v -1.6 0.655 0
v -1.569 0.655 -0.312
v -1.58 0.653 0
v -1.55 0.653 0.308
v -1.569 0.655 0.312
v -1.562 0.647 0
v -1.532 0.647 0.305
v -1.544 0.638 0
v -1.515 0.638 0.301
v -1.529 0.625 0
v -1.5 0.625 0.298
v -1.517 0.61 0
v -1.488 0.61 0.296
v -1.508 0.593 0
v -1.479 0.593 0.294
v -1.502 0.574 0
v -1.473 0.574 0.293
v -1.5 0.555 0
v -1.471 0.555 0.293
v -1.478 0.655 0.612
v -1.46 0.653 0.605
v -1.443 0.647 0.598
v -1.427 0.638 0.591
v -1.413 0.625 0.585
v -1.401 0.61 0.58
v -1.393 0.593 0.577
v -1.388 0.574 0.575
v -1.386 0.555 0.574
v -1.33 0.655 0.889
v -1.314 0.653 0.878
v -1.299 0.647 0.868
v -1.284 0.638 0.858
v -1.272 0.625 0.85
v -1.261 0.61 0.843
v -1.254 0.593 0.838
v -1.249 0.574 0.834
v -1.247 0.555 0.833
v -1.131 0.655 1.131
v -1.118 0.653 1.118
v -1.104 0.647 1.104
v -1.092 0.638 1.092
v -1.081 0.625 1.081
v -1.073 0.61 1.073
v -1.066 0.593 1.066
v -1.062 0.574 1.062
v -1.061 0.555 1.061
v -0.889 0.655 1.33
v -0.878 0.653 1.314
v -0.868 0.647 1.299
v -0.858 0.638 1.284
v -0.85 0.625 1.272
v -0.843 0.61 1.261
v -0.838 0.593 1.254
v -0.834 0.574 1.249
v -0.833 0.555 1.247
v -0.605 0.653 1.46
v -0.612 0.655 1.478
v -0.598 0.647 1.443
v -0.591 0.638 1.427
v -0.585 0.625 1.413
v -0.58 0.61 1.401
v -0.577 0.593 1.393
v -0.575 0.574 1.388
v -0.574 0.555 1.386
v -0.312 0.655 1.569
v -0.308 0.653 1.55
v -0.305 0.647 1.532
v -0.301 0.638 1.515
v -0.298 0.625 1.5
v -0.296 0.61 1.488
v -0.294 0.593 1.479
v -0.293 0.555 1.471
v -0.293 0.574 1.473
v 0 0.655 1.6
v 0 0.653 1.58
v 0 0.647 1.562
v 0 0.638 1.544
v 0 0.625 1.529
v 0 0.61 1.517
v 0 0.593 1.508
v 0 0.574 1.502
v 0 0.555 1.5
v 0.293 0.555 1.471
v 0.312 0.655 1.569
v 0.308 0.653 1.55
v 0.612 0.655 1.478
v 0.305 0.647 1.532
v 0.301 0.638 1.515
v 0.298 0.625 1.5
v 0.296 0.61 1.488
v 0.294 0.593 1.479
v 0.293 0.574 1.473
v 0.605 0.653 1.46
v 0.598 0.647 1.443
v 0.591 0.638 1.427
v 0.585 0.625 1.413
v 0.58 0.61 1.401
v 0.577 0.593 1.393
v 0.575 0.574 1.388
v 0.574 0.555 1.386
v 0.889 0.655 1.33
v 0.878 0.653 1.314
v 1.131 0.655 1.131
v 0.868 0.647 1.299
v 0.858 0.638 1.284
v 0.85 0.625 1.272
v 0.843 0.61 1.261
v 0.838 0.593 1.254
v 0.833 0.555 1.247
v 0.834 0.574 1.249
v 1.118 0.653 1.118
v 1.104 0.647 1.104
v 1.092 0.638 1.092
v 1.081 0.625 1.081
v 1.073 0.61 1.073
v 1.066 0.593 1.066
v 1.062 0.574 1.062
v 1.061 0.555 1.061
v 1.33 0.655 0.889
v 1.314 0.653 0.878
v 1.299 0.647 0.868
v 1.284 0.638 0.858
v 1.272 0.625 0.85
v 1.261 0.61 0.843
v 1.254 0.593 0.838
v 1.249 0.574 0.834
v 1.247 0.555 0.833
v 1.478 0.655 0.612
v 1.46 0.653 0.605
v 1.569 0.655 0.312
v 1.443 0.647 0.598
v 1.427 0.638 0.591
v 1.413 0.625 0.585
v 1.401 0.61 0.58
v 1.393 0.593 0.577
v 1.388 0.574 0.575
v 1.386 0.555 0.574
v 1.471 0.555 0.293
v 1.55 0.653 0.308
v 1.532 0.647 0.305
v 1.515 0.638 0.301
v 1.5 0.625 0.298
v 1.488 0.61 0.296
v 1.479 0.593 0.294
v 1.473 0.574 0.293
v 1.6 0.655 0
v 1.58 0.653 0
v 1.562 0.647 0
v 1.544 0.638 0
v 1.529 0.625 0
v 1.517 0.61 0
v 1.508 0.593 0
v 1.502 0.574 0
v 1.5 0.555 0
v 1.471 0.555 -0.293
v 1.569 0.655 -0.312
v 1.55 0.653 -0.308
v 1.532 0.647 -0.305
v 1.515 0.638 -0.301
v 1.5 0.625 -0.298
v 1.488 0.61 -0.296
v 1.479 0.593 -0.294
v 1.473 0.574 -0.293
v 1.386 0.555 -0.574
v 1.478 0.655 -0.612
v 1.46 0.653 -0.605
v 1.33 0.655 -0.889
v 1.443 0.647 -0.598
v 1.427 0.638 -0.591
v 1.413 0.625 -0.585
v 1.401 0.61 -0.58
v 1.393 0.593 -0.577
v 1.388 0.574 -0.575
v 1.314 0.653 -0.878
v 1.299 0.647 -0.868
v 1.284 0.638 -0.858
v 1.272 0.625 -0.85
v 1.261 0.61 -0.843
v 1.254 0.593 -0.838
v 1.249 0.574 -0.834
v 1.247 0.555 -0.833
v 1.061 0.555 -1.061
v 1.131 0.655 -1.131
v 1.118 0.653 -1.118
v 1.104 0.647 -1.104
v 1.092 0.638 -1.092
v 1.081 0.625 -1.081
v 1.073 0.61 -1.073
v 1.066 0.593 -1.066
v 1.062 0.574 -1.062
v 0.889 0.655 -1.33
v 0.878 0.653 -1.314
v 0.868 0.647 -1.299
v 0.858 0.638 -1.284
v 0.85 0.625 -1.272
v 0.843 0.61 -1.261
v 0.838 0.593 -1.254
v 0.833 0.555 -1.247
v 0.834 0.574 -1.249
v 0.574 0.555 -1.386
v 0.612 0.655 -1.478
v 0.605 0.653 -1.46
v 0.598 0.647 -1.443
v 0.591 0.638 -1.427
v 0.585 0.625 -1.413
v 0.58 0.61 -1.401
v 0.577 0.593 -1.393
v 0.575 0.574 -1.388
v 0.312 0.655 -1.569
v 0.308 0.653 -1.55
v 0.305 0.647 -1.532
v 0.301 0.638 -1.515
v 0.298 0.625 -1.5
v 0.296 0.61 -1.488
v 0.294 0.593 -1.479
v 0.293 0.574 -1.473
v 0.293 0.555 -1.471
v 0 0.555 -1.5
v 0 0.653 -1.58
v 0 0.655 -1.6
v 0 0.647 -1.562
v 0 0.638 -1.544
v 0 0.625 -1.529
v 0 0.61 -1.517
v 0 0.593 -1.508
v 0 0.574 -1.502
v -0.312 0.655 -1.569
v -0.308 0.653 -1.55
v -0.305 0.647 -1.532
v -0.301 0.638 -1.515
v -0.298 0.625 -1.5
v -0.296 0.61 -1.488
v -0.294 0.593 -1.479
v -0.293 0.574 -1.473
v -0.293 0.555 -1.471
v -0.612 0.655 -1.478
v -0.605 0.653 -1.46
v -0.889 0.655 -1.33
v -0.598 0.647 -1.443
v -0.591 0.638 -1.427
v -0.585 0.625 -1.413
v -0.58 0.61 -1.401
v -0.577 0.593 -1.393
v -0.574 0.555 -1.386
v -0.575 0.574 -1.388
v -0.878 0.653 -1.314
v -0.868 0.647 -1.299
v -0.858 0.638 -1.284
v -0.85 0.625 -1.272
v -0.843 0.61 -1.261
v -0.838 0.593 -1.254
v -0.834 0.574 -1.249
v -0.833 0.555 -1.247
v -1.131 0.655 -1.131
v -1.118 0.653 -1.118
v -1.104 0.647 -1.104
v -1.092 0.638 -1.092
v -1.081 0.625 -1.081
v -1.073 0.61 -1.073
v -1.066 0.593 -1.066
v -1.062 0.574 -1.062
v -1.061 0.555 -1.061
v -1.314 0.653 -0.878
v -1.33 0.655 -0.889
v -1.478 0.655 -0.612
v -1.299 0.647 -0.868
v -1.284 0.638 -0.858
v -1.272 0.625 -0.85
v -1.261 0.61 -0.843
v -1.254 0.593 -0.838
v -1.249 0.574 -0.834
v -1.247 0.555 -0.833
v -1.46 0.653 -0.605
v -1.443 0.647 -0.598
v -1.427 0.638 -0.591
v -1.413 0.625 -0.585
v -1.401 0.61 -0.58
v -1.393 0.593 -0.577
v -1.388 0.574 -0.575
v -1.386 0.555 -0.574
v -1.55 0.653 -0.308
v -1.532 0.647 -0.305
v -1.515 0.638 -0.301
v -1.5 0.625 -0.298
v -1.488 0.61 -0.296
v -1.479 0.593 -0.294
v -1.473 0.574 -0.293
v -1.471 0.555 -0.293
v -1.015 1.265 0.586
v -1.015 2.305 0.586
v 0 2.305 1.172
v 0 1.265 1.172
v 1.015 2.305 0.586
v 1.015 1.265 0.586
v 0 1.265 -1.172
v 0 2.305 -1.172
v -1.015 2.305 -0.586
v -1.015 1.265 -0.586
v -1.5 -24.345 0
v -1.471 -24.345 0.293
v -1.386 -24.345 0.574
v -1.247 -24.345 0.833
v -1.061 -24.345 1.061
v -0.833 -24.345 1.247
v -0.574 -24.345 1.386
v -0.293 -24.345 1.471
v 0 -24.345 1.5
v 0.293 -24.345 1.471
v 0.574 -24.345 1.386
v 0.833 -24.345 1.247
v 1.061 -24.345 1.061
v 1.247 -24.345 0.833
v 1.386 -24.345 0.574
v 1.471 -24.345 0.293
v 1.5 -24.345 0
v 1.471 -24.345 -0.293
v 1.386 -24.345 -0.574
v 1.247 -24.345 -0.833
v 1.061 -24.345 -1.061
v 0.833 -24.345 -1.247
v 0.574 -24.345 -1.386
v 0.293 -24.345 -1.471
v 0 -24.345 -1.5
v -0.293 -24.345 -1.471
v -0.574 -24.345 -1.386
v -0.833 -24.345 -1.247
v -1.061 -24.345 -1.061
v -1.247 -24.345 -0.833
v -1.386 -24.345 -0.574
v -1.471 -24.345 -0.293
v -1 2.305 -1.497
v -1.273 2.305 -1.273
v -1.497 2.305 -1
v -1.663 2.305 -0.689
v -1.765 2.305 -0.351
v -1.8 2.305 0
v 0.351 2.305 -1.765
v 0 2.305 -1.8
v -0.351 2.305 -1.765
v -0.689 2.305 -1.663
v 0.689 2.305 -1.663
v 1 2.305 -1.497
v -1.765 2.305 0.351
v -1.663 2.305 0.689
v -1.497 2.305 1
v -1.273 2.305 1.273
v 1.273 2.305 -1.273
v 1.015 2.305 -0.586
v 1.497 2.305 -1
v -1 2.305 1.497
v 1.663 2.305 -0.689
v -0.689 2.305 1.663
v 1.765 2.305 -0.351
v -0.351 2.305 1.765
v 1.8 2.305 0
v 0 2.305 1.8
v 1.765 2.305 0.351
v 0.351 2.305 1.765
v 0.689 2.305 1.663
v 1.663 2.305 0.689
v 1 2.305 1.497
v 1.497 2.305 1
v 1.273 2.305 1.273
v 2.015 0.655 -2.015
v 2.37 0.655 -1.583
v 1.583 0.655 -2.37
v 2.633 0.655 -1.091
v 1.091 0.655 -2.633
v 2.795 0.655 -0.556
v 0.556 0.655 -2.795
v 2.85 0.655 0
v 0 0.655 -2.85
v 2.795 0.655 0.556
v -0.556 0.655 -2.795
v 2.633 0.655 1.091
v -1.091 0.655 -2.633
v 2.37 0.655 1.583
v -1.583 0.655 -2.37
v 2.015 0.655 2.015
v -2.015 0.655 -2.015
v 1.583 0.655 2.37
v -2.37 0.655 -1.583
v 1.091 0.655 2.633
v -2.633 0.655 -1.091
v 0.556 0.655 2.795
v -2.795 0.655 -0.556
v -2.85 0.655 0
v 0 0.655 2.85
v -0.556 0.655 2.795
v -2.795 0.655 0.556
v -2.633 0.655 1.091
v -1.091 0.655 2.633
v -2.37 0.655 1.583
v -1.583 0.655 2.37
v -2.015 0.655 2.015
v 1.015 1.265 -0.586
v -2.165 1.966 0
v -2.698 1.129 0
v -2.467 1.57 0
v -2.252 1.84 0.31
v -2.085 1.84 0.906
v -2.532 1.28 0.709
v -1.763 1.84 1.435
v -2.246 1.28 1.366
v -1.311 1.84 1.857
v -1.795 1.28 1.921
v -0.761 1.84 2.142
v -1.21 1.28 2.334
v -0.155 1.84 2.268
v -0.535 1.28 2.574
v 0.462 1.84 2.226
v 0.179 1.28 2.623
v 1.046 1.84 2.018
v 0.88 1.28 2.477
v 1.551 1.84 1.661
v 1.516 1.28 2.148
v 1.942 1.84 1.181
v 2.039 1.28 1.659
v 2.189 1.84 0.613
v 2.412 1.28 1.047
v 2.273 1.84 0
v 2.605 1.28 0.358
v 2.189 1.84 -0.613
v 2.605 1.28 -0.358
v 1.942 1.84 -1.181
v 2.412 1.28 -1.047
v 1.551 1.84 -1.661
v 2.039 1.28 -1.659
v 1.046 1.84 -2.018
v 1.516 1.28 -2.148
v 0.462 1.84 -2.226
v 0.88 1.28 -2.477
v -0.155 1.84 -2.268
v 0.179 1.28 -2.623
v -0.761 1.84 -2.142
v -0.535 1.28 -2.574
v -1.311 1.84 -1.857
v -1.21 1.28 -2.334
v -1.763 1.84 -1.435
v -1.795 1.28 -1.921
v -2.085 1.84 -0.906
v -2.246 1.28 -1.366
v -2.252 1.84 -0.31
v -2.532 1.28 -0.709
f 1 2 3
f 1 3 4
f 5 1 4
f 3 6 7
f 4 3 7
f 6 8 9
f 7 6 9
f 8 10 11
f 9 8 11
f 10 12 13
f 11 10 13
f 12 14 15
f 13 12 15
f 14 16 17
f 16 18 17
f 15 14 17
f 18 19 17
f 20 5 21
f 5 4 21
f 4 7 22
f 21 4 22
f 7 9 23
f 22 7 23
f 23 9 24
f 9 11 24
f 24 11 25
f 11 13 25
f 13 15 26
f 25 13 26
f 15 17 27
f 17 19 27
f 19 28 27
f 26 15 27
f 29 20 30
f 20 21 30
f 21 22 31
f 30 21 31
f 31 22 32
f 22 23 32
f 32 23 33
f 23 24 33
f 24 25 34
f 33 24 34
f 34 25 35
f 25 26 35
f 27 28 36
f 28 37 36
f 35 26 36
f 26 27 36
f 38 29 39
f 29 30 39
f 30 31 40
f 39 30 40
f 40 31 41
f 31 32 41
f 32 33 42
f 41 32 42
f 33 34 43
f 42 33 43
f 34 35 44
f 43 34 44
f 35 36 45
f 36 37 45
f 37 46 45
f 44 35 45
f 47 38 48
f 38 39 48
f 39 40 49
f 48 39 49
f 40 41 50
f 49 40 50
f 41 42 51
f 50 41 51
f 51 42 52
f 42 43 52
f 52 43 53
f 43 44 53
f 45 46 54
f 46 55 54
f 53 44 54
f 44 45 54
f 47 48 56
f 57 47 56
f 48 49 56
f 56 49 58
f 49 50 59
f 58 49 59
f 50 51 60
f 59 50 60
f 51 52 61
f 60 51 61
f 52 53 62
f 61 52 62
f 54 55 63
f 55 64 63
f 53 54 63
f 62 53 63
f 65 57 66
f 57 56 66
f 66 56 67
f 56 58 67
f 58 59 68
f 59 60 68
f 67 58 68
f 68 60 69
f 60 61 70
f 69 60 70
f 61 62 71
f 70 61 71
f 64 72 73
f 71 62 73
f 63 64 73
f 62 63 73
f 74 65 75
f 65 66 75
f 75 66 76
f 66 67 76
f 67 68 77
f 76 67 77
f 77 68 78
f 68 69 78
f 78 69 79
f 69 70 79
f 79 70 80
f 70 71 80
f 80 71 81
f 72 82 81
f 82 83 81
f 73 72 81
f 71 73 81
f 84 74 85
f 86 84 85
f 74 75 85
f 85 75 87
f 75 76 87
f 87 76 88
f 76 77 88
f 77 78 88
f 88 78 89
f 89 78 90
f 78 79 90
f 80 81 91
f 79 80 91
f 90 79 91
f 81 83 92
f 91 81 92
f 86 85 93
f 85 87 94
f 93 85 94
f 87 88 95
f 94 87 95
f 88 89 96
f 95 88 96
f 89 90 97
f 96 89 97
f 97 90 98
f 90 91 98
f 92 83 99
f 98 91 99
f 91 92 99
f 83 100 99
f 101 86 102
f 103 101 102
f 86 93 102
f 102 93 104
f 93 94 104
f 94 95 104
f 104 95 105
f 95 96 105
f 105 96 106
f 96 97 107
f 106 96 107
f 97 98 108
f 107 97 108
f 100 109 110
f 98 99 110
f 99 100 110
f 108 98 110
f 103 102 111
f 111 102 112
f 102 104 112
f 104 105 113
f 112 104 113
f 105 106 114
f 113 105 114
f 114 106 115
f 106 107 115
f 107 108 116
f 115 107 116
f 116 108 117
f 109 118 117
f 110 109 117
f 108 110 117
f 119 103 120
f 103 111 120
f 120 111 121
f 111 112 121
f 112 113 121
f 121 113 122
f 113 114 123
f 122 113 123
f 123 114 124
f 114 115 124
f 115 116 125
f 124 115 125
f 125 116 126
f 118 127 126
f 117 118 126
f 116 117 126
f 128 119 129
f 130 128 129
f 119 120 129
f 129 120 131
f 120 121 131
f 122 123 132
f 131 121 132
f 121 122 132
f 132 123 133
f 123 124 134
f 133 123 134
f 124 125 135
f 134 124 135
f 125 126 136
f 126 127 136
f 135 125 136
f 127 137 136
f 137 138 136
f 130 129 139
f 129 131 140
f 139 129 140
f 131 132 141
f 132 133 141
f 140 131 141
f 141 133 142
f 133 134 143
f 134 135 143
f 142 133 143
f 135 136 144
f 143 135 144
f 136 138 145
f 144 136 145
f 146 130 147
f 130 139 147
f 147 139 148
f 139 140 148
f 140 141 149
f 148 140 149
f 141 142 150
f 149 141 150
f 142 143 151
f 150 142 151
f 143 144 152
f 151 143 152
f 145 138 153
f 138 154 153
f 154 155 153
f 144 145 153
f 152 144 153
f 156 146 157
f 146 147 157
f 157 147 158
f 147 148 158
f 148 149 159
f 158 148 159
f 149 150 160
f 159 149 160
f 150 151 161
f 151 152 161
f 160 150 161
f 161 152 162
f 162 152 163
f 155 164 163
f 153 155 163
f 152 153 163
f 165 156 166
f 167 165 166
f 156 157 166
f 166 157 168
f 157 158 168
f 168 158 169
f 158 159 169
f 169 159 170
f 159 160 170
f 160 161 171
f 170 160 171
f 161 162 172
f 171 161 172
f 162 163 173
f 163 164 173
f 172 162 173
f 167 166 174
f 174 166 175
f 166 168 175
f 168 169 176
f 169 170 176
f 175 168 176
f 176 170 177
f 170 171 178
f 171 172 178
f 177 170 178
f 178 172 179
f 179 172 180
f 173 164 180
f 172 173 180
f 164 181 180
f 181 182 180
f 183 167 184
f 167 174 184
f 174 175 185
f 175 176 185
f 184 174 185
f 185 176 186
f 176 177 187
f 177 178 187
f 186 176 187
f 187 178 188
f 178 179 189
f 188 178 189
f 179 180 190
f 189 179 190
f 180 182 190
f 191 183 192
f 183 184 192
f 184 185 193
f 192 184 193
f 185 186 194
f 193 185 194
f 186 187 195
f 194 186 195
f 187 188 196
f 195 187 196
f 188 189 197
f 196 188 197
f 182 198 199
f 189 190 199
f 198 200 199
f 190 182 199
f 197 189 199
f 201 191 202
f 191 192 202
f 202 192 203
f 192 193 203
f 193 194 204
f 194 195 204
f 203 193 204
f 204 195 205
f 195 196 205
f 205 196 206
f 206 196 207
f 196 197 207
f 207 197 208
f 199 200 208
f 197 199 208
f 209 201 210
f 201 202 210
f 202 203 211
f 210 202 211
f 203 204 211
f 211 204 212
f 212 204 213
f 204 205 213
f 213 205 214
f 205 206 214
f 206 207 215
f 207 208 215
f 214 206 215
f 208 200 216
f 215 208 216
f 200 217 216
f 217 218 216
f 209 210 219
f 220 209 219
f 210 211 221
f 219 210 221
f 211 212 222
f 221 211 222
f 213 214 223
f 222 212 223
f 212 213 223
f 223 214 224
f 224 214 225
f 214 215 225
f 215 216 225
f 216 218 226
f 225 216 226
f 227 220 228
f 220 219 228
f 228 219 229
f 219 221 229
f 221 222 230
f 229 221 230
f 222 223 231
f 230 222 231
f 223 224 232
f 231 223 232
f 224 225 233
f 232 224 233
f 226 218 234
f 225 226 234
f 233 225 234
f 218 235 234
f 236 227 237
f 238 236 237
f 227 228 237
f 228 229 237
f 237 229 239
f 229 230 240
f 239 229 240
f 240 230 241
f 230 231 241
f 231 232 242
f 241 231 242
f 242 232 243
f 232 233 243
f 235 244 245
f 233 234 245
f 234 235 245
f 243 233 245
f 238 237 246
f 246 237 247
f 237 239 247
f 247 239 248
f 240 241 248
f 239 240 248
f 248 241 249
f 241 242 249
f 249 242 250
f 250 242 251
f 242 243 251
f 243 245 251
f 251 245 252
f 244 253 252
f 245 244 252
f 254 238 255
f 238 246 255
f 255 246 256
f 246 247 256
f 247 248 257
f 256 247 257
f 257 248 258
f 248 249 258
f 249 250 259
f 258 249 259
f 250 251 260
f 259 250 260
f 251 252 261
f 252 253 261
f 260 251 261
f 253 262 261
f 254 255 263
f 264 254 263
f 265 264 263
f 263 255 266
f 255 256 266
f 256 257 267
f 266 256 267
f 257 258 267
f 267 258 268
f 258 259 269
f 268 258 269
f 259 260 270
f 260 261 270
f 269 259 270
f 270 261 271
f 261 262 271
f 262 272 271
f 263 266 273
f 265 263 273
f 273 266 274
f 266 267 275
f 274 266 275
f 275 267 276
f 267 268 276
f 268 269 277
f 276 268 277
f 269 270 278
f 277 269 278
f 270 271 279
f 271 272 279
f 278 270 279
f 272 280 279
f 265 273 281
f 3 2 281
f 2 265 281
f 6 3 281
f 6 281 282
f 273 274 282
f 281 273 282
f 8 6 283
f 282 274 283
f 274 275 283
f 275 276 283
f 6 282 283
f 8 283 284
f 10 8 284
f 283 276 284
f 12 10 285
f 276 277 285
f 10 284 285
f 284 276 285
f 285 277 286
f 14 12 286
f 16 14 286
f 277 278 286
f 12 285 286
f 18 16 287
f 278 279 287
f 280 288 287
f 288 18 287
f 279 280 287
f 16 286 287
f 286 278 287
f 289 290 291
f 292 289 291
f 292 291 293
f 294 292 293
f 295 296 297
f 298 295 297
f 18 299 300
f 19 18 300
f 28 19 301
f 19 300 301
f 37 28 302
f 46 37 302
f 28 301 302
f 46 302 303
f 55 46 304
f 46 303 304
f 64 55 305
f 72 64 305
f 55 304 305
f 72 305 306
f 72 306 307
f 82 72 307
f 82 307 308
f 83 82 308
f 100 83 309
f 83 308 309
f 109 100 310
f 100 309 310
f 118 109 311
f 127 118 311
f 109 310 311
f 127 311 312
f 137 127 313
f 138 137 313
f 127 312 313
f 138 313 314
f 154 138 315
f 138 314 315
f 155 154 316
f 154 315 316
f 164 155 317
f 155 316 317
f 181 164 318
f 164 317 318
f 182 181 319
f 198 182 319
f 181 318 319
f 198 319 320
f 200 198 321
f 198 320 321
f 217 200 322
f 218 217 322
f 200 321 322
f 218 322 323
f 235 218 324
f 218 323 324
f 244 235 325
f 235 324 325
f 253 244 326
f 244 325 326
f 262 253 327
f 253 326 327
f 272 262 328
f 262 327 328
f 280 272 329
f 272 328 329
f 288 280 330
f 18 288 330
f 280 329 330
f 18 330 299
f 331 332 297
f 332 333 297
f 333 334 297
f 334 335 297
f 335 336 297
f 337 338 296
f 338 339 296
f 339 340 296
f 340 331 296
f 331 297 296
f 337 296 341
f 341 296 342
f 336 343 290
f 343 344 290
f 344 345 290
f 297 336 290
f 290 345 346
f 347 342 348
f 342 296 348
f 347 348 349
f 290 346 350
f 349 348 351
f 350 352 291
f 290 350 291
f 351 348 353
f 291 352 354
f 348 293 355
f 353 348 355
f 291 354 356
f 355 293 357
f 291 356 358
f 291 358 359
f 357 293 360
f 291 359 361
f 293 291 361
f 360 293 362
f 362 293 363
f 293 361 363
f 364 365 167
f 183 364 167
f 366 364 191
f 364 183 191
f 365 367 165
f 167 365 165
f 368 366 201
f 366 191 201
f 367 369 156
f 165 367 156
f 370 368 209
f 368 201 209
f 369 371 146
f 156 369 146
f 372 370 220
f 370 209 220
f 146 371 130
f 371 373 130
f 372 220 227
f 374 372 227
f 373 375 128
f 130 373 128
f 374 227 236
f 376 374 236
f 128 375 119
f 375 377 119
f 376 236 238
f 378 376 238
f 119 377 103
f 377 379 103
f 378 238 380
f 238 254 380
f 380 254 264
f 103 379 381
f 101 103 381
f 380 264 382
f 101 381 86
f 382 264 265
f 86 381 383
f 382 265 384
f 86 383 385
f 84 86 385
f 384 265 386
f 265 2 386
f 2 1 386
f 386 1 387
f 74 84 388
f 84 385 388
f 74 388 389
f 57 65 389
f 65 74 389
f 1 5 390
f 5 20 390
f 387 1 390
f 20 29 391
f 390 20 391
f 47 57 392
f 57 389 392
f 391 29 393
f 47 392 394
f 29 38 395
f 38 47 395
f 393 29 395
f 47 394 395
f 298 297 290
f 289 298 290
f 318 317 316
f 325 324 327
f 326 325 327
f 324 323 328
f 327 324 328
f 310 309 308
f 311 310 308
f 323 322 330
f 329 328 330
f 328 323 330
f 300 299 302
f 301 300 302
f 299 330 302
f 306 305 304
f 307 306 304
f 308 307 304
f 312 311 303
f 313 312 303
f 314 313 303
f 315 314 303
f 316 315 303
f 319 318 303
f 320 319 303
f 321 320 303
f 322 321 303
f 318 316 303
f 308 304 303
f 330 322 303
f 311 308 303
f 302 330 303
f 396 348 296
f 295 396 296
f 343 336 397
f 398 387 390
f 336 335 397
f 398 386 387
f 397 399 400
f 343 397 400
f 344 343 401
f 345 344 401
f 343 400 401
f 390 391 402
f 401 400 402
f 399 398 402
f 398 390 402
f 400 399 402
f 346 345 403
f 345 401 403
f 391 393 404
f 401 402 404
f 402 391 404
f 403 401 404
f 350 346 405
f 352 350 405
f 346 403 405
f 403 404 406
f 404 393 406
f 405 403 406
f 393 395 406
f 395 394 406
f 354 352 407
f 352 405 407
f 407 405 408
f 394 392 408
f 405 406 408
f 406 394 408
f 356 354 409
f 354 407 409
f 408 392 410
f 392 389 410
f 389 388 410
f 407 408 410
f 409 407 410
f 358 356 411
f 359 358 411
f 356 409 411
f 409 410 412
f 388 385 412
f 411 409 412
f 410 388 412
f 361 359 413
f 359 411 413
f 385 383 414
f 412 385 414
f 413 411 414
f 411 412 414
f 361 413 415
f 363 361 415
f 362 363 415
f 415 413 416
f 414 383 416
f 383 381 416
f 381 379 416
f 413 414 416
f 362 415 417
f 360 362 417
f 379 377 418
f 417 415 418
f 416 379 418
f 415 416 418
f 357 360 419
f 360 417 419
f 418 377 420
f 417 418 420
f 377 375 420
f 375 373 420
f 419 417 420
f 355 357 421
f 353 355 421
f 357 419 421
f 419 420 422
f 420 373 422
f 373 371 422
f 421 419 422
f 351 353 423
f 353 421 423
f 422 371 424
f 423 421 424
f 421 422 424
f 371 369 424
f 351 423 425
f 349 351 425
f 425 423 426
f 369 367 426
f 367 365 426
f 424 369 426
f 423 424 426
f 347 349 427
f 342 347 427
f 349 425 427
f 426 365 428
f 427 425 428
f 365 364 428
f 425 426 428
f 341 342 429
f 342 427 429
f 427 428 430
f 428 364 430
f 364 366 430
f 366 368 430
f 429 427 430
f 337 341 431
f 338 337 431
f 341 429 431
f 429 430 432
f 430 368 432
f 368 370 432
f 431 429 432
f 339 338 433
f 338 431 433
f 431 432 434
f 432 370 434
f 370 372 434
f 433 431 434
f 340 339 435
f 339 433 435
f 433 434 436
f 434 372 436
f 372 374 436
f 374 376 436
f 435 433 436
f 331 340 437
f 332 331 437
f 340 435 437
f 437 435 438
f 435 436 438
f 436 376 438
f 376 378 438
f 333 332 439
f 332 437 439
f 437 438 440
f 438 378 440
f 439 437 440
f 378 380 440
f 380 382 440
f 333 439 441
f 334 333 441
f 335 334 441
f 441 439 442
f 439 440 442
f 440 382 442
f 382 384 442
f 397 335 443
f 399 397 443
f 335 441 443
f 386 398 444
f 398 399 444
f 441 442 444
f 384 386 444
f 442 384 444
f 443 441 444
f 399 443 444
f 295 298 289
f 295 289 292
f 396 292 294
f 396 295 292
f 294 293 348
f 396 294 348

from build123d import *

# Parameters (mm, degrees)
CUT_EXTRUDE_1_DEPTH = 1.04
FILLET_1_R          = 0.1


with BuildPart() as part:
    # 草图1 → 旋转1 (revolve)
    with BuildSketch(Plane.XY):
        with BuildLine():
            Line((0, 2.304545455), (-1.8, 2.304545455))
            ThreePointArc((-1.8, 2.304545455), (-2.467032631, 1.569929856), (-2.85, 0.654545455))
            Line((-2.85, 0.654545455), (-1.5, 0.654545455))
            Line((-1.5, 0.654545455), (-1.5, -24.345454545))
            Line((-1.5, -24.345454545), (0, -24.345454545))
            Line((0, -24.345454545), (0, 2.304545455))
        make_face()
    revolve(axis=Axis((0, 0, 0), (0, 1, 0)))

    # 草图2 → 切除-拉伸1 (cut)
    with BuildSketch(Plane(origin=(0, 2.304545455, 0), x_dir=(1, 0, 0), z_dir=(0, 1, 0))):
        Polygon((0, -1.172021046), (1.015, -0.586010523), (1.015, 0.586010523), (0, 1.172021046), (-1.015, 0.586010523), (-1.015, -0.586010523), align=None)
    extrude(amount=-CUT_EXTRUDE_1_DEPTH, mode=Mode.SUBTRACT)

    # 圆角1
    fillet_1_edges = [part.edges().sort_by_distance(p)[0] for p in [
        (1.5, 0.654545455, 0),
    ]]
    fillet(fillet_1_edges, radius=FILLET_1_R)


solid = part.part
